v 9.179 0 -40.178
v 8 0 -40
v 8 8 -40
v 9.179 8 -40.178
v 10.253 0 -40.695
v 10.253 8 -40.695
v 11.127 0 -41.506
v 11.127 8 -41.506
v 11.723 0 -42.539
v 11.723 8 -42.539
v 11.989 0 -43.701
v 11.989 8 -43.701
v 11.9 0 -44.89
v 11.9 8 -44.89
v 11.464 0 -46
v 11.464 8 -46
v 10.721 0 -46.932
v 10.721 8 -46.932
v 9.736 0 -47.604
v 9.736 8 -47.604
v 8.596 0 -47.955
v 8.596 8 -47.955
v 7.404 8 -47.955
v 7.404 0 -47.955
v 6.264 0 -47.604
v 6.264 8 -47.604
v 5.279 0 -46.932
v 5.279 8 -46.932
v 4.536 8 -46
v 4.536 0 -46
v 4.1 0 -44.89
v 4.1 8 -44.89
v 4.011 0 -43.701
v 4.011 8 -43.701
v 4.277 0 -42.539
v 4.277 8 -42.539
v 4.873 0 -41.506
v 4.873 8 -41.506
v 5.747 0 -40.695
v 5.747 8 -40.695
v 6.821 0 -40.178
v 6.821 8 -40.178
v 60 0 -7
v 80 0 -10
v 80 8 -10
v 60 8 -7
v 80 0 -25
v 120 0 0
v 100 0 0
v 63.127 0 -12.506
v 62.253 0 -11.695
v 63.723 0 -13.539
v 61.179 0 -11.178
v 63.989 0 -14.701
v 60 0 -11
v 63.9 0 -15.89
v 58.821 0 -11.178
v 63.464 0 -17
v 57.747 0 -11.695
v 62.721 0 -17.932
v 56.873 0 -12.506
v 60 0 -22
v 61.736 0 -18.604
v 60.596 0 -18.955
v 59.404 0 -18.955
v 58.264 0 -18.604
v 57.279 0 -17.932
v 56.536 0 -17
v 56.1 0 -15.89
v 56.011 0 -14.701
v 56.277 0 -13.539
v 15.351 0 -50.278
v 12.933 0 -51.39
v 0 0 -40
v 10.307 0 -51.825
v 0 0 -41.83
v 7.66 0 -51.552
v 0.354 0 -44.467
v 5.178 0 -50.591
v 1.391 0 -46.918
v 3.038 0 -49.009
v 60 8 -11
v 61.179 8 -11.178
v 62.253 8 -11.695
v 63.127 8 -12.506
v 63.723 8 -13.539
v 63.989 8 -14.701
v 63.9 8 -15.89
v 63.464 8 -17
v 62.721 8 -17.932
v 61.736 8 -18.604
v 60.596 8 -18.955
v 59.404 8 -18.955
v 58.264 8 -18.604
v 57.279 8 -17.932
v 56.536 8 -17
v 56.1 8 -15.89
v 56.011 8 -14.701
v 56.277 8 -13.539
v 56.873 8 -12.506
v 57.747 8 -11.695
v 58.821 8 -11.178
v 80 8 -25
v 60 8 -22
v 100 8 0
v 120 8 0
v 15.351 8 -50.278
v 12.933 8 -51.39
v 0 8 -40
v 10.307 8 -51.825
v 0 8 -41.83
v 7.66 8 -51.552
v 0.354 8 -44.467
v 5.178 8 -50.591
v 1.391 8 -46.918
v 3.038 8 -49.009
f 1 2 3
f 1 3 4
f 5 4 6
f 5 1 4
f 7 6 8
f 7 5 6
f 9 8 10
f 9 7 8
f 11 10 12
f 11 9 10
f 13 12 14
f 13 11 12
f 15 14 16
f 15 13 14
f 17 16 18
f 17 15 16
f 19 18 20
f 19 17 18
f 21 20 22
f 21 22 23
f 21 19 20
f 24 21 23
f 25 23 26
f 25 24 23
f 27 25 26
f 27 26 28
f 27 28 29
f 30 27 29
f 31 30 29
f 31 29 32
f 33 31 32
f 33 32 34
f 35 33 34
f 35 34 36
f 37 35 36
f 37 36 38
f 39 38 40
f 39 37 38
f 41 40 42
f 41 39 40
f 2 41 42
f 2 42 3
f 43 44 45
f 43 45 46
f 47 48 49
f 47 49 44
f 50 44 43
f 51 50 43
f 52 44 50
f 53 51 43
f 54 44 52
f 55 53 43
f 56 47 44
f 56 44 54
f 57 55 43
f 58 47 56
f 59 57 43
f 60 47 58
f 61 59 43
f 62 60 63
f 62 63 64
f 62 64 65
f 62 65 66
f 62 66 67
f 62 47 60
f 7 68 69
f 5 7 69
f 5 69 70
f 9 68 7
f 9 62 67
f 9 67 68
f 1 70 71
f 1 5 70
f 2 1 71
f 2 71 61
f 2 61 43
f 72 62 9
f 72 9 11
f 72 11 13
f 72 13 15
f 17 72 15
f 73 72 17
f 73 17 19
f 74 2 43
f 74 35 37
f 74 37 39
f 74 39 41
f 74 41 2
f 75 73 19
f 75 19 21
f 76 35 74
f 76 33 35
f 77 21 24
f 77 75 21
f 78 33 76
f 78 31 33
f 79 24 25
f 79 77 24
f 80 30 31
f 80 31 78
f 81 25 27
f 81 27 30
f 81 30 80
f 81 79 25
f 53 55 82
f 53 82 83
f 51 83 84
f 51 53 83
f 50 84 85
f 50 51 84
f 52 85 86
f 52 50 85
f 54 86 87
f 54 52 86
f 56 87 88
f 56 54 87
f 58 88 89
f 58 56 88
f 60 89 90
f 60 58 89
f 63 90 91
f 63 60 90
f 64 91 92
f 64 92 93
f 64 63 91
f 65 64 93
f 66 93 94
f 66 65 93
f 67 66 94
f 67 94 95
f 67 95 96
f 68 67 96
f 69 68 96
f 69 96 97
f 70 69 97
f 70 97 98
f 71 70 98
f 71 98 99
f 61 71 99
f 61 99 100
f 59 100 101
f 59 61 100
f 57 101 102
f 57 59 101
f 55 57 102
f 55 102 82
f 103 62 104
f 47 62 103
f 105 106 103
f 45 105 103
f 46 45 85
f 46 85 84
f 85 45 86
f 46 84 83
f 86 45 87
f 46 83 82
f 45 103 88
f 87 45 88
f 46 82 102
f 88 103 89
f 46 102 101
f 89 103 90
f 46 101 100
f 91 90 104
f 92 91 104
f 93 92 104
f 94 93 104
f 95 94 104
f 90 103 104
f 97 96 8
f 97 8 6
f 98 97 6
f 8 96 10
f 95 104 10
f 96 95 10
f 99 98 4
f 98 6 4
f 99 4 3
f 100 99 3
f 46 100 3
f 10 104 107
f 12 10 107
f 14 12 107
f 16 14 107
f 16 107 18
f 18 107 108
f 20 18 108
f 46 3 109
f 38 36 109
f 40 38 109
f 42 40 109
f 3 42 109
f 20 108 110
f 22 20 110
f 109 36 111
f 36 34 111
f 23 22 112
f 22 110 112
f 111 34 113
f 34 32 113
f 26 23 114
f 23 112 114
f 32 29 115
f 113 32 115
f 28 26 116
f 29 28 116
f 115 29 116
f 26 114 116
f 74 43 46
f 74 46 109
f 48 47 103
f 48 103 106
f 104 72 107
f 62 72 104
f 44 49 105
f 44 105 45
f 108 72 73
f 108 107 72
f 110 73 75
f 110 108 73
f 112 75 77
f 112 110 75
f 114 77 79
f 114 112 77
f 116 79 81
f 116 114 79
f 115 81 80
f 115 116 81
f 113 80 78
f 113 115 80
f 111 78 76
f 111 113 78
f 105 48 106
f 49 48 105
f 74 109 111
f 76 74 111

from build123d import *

# Parameters (mm, degrees)
SKETCH1_R           = 4
BOSS_EXTRUDE1_DEPTH = 8
FILLET1_R           = 10


with BuildPart() as part:
    # Sketch1 → Boss-Extrude1 (new body)
    with BuildSketch(Plane(origin=(0, 0, 0), x_dir=(1, 0, 0), z_dir=(0, 1, 0))):
        Polygon((120, 0), (100, 0), (80, 10), (60, 7), (0, 40), (0, 60), (60, 22), (80, 25), align=None)
        with Locations(Location((60, 15, 0), (0, 0, 270))):
            Circle(SKETCH1_R, mode=Mode.SUBTRACT)
        with Locations(Location((8, 44, 0), (0, 0, 270))):
            Circle(SKETCH1_R, mode=Mode.SUBTRACT)
    extrude(amount=BOSS_EXTRUDE1_DEPTH)

    # Fillet1
    fillet1_edges = [part.edges().sort_by_distance(p)[0] for p in [
        (0, 4, -60),
    ]]
    fillet(fillet1_edges, radius=FILLET1_R)


solid = part.part
